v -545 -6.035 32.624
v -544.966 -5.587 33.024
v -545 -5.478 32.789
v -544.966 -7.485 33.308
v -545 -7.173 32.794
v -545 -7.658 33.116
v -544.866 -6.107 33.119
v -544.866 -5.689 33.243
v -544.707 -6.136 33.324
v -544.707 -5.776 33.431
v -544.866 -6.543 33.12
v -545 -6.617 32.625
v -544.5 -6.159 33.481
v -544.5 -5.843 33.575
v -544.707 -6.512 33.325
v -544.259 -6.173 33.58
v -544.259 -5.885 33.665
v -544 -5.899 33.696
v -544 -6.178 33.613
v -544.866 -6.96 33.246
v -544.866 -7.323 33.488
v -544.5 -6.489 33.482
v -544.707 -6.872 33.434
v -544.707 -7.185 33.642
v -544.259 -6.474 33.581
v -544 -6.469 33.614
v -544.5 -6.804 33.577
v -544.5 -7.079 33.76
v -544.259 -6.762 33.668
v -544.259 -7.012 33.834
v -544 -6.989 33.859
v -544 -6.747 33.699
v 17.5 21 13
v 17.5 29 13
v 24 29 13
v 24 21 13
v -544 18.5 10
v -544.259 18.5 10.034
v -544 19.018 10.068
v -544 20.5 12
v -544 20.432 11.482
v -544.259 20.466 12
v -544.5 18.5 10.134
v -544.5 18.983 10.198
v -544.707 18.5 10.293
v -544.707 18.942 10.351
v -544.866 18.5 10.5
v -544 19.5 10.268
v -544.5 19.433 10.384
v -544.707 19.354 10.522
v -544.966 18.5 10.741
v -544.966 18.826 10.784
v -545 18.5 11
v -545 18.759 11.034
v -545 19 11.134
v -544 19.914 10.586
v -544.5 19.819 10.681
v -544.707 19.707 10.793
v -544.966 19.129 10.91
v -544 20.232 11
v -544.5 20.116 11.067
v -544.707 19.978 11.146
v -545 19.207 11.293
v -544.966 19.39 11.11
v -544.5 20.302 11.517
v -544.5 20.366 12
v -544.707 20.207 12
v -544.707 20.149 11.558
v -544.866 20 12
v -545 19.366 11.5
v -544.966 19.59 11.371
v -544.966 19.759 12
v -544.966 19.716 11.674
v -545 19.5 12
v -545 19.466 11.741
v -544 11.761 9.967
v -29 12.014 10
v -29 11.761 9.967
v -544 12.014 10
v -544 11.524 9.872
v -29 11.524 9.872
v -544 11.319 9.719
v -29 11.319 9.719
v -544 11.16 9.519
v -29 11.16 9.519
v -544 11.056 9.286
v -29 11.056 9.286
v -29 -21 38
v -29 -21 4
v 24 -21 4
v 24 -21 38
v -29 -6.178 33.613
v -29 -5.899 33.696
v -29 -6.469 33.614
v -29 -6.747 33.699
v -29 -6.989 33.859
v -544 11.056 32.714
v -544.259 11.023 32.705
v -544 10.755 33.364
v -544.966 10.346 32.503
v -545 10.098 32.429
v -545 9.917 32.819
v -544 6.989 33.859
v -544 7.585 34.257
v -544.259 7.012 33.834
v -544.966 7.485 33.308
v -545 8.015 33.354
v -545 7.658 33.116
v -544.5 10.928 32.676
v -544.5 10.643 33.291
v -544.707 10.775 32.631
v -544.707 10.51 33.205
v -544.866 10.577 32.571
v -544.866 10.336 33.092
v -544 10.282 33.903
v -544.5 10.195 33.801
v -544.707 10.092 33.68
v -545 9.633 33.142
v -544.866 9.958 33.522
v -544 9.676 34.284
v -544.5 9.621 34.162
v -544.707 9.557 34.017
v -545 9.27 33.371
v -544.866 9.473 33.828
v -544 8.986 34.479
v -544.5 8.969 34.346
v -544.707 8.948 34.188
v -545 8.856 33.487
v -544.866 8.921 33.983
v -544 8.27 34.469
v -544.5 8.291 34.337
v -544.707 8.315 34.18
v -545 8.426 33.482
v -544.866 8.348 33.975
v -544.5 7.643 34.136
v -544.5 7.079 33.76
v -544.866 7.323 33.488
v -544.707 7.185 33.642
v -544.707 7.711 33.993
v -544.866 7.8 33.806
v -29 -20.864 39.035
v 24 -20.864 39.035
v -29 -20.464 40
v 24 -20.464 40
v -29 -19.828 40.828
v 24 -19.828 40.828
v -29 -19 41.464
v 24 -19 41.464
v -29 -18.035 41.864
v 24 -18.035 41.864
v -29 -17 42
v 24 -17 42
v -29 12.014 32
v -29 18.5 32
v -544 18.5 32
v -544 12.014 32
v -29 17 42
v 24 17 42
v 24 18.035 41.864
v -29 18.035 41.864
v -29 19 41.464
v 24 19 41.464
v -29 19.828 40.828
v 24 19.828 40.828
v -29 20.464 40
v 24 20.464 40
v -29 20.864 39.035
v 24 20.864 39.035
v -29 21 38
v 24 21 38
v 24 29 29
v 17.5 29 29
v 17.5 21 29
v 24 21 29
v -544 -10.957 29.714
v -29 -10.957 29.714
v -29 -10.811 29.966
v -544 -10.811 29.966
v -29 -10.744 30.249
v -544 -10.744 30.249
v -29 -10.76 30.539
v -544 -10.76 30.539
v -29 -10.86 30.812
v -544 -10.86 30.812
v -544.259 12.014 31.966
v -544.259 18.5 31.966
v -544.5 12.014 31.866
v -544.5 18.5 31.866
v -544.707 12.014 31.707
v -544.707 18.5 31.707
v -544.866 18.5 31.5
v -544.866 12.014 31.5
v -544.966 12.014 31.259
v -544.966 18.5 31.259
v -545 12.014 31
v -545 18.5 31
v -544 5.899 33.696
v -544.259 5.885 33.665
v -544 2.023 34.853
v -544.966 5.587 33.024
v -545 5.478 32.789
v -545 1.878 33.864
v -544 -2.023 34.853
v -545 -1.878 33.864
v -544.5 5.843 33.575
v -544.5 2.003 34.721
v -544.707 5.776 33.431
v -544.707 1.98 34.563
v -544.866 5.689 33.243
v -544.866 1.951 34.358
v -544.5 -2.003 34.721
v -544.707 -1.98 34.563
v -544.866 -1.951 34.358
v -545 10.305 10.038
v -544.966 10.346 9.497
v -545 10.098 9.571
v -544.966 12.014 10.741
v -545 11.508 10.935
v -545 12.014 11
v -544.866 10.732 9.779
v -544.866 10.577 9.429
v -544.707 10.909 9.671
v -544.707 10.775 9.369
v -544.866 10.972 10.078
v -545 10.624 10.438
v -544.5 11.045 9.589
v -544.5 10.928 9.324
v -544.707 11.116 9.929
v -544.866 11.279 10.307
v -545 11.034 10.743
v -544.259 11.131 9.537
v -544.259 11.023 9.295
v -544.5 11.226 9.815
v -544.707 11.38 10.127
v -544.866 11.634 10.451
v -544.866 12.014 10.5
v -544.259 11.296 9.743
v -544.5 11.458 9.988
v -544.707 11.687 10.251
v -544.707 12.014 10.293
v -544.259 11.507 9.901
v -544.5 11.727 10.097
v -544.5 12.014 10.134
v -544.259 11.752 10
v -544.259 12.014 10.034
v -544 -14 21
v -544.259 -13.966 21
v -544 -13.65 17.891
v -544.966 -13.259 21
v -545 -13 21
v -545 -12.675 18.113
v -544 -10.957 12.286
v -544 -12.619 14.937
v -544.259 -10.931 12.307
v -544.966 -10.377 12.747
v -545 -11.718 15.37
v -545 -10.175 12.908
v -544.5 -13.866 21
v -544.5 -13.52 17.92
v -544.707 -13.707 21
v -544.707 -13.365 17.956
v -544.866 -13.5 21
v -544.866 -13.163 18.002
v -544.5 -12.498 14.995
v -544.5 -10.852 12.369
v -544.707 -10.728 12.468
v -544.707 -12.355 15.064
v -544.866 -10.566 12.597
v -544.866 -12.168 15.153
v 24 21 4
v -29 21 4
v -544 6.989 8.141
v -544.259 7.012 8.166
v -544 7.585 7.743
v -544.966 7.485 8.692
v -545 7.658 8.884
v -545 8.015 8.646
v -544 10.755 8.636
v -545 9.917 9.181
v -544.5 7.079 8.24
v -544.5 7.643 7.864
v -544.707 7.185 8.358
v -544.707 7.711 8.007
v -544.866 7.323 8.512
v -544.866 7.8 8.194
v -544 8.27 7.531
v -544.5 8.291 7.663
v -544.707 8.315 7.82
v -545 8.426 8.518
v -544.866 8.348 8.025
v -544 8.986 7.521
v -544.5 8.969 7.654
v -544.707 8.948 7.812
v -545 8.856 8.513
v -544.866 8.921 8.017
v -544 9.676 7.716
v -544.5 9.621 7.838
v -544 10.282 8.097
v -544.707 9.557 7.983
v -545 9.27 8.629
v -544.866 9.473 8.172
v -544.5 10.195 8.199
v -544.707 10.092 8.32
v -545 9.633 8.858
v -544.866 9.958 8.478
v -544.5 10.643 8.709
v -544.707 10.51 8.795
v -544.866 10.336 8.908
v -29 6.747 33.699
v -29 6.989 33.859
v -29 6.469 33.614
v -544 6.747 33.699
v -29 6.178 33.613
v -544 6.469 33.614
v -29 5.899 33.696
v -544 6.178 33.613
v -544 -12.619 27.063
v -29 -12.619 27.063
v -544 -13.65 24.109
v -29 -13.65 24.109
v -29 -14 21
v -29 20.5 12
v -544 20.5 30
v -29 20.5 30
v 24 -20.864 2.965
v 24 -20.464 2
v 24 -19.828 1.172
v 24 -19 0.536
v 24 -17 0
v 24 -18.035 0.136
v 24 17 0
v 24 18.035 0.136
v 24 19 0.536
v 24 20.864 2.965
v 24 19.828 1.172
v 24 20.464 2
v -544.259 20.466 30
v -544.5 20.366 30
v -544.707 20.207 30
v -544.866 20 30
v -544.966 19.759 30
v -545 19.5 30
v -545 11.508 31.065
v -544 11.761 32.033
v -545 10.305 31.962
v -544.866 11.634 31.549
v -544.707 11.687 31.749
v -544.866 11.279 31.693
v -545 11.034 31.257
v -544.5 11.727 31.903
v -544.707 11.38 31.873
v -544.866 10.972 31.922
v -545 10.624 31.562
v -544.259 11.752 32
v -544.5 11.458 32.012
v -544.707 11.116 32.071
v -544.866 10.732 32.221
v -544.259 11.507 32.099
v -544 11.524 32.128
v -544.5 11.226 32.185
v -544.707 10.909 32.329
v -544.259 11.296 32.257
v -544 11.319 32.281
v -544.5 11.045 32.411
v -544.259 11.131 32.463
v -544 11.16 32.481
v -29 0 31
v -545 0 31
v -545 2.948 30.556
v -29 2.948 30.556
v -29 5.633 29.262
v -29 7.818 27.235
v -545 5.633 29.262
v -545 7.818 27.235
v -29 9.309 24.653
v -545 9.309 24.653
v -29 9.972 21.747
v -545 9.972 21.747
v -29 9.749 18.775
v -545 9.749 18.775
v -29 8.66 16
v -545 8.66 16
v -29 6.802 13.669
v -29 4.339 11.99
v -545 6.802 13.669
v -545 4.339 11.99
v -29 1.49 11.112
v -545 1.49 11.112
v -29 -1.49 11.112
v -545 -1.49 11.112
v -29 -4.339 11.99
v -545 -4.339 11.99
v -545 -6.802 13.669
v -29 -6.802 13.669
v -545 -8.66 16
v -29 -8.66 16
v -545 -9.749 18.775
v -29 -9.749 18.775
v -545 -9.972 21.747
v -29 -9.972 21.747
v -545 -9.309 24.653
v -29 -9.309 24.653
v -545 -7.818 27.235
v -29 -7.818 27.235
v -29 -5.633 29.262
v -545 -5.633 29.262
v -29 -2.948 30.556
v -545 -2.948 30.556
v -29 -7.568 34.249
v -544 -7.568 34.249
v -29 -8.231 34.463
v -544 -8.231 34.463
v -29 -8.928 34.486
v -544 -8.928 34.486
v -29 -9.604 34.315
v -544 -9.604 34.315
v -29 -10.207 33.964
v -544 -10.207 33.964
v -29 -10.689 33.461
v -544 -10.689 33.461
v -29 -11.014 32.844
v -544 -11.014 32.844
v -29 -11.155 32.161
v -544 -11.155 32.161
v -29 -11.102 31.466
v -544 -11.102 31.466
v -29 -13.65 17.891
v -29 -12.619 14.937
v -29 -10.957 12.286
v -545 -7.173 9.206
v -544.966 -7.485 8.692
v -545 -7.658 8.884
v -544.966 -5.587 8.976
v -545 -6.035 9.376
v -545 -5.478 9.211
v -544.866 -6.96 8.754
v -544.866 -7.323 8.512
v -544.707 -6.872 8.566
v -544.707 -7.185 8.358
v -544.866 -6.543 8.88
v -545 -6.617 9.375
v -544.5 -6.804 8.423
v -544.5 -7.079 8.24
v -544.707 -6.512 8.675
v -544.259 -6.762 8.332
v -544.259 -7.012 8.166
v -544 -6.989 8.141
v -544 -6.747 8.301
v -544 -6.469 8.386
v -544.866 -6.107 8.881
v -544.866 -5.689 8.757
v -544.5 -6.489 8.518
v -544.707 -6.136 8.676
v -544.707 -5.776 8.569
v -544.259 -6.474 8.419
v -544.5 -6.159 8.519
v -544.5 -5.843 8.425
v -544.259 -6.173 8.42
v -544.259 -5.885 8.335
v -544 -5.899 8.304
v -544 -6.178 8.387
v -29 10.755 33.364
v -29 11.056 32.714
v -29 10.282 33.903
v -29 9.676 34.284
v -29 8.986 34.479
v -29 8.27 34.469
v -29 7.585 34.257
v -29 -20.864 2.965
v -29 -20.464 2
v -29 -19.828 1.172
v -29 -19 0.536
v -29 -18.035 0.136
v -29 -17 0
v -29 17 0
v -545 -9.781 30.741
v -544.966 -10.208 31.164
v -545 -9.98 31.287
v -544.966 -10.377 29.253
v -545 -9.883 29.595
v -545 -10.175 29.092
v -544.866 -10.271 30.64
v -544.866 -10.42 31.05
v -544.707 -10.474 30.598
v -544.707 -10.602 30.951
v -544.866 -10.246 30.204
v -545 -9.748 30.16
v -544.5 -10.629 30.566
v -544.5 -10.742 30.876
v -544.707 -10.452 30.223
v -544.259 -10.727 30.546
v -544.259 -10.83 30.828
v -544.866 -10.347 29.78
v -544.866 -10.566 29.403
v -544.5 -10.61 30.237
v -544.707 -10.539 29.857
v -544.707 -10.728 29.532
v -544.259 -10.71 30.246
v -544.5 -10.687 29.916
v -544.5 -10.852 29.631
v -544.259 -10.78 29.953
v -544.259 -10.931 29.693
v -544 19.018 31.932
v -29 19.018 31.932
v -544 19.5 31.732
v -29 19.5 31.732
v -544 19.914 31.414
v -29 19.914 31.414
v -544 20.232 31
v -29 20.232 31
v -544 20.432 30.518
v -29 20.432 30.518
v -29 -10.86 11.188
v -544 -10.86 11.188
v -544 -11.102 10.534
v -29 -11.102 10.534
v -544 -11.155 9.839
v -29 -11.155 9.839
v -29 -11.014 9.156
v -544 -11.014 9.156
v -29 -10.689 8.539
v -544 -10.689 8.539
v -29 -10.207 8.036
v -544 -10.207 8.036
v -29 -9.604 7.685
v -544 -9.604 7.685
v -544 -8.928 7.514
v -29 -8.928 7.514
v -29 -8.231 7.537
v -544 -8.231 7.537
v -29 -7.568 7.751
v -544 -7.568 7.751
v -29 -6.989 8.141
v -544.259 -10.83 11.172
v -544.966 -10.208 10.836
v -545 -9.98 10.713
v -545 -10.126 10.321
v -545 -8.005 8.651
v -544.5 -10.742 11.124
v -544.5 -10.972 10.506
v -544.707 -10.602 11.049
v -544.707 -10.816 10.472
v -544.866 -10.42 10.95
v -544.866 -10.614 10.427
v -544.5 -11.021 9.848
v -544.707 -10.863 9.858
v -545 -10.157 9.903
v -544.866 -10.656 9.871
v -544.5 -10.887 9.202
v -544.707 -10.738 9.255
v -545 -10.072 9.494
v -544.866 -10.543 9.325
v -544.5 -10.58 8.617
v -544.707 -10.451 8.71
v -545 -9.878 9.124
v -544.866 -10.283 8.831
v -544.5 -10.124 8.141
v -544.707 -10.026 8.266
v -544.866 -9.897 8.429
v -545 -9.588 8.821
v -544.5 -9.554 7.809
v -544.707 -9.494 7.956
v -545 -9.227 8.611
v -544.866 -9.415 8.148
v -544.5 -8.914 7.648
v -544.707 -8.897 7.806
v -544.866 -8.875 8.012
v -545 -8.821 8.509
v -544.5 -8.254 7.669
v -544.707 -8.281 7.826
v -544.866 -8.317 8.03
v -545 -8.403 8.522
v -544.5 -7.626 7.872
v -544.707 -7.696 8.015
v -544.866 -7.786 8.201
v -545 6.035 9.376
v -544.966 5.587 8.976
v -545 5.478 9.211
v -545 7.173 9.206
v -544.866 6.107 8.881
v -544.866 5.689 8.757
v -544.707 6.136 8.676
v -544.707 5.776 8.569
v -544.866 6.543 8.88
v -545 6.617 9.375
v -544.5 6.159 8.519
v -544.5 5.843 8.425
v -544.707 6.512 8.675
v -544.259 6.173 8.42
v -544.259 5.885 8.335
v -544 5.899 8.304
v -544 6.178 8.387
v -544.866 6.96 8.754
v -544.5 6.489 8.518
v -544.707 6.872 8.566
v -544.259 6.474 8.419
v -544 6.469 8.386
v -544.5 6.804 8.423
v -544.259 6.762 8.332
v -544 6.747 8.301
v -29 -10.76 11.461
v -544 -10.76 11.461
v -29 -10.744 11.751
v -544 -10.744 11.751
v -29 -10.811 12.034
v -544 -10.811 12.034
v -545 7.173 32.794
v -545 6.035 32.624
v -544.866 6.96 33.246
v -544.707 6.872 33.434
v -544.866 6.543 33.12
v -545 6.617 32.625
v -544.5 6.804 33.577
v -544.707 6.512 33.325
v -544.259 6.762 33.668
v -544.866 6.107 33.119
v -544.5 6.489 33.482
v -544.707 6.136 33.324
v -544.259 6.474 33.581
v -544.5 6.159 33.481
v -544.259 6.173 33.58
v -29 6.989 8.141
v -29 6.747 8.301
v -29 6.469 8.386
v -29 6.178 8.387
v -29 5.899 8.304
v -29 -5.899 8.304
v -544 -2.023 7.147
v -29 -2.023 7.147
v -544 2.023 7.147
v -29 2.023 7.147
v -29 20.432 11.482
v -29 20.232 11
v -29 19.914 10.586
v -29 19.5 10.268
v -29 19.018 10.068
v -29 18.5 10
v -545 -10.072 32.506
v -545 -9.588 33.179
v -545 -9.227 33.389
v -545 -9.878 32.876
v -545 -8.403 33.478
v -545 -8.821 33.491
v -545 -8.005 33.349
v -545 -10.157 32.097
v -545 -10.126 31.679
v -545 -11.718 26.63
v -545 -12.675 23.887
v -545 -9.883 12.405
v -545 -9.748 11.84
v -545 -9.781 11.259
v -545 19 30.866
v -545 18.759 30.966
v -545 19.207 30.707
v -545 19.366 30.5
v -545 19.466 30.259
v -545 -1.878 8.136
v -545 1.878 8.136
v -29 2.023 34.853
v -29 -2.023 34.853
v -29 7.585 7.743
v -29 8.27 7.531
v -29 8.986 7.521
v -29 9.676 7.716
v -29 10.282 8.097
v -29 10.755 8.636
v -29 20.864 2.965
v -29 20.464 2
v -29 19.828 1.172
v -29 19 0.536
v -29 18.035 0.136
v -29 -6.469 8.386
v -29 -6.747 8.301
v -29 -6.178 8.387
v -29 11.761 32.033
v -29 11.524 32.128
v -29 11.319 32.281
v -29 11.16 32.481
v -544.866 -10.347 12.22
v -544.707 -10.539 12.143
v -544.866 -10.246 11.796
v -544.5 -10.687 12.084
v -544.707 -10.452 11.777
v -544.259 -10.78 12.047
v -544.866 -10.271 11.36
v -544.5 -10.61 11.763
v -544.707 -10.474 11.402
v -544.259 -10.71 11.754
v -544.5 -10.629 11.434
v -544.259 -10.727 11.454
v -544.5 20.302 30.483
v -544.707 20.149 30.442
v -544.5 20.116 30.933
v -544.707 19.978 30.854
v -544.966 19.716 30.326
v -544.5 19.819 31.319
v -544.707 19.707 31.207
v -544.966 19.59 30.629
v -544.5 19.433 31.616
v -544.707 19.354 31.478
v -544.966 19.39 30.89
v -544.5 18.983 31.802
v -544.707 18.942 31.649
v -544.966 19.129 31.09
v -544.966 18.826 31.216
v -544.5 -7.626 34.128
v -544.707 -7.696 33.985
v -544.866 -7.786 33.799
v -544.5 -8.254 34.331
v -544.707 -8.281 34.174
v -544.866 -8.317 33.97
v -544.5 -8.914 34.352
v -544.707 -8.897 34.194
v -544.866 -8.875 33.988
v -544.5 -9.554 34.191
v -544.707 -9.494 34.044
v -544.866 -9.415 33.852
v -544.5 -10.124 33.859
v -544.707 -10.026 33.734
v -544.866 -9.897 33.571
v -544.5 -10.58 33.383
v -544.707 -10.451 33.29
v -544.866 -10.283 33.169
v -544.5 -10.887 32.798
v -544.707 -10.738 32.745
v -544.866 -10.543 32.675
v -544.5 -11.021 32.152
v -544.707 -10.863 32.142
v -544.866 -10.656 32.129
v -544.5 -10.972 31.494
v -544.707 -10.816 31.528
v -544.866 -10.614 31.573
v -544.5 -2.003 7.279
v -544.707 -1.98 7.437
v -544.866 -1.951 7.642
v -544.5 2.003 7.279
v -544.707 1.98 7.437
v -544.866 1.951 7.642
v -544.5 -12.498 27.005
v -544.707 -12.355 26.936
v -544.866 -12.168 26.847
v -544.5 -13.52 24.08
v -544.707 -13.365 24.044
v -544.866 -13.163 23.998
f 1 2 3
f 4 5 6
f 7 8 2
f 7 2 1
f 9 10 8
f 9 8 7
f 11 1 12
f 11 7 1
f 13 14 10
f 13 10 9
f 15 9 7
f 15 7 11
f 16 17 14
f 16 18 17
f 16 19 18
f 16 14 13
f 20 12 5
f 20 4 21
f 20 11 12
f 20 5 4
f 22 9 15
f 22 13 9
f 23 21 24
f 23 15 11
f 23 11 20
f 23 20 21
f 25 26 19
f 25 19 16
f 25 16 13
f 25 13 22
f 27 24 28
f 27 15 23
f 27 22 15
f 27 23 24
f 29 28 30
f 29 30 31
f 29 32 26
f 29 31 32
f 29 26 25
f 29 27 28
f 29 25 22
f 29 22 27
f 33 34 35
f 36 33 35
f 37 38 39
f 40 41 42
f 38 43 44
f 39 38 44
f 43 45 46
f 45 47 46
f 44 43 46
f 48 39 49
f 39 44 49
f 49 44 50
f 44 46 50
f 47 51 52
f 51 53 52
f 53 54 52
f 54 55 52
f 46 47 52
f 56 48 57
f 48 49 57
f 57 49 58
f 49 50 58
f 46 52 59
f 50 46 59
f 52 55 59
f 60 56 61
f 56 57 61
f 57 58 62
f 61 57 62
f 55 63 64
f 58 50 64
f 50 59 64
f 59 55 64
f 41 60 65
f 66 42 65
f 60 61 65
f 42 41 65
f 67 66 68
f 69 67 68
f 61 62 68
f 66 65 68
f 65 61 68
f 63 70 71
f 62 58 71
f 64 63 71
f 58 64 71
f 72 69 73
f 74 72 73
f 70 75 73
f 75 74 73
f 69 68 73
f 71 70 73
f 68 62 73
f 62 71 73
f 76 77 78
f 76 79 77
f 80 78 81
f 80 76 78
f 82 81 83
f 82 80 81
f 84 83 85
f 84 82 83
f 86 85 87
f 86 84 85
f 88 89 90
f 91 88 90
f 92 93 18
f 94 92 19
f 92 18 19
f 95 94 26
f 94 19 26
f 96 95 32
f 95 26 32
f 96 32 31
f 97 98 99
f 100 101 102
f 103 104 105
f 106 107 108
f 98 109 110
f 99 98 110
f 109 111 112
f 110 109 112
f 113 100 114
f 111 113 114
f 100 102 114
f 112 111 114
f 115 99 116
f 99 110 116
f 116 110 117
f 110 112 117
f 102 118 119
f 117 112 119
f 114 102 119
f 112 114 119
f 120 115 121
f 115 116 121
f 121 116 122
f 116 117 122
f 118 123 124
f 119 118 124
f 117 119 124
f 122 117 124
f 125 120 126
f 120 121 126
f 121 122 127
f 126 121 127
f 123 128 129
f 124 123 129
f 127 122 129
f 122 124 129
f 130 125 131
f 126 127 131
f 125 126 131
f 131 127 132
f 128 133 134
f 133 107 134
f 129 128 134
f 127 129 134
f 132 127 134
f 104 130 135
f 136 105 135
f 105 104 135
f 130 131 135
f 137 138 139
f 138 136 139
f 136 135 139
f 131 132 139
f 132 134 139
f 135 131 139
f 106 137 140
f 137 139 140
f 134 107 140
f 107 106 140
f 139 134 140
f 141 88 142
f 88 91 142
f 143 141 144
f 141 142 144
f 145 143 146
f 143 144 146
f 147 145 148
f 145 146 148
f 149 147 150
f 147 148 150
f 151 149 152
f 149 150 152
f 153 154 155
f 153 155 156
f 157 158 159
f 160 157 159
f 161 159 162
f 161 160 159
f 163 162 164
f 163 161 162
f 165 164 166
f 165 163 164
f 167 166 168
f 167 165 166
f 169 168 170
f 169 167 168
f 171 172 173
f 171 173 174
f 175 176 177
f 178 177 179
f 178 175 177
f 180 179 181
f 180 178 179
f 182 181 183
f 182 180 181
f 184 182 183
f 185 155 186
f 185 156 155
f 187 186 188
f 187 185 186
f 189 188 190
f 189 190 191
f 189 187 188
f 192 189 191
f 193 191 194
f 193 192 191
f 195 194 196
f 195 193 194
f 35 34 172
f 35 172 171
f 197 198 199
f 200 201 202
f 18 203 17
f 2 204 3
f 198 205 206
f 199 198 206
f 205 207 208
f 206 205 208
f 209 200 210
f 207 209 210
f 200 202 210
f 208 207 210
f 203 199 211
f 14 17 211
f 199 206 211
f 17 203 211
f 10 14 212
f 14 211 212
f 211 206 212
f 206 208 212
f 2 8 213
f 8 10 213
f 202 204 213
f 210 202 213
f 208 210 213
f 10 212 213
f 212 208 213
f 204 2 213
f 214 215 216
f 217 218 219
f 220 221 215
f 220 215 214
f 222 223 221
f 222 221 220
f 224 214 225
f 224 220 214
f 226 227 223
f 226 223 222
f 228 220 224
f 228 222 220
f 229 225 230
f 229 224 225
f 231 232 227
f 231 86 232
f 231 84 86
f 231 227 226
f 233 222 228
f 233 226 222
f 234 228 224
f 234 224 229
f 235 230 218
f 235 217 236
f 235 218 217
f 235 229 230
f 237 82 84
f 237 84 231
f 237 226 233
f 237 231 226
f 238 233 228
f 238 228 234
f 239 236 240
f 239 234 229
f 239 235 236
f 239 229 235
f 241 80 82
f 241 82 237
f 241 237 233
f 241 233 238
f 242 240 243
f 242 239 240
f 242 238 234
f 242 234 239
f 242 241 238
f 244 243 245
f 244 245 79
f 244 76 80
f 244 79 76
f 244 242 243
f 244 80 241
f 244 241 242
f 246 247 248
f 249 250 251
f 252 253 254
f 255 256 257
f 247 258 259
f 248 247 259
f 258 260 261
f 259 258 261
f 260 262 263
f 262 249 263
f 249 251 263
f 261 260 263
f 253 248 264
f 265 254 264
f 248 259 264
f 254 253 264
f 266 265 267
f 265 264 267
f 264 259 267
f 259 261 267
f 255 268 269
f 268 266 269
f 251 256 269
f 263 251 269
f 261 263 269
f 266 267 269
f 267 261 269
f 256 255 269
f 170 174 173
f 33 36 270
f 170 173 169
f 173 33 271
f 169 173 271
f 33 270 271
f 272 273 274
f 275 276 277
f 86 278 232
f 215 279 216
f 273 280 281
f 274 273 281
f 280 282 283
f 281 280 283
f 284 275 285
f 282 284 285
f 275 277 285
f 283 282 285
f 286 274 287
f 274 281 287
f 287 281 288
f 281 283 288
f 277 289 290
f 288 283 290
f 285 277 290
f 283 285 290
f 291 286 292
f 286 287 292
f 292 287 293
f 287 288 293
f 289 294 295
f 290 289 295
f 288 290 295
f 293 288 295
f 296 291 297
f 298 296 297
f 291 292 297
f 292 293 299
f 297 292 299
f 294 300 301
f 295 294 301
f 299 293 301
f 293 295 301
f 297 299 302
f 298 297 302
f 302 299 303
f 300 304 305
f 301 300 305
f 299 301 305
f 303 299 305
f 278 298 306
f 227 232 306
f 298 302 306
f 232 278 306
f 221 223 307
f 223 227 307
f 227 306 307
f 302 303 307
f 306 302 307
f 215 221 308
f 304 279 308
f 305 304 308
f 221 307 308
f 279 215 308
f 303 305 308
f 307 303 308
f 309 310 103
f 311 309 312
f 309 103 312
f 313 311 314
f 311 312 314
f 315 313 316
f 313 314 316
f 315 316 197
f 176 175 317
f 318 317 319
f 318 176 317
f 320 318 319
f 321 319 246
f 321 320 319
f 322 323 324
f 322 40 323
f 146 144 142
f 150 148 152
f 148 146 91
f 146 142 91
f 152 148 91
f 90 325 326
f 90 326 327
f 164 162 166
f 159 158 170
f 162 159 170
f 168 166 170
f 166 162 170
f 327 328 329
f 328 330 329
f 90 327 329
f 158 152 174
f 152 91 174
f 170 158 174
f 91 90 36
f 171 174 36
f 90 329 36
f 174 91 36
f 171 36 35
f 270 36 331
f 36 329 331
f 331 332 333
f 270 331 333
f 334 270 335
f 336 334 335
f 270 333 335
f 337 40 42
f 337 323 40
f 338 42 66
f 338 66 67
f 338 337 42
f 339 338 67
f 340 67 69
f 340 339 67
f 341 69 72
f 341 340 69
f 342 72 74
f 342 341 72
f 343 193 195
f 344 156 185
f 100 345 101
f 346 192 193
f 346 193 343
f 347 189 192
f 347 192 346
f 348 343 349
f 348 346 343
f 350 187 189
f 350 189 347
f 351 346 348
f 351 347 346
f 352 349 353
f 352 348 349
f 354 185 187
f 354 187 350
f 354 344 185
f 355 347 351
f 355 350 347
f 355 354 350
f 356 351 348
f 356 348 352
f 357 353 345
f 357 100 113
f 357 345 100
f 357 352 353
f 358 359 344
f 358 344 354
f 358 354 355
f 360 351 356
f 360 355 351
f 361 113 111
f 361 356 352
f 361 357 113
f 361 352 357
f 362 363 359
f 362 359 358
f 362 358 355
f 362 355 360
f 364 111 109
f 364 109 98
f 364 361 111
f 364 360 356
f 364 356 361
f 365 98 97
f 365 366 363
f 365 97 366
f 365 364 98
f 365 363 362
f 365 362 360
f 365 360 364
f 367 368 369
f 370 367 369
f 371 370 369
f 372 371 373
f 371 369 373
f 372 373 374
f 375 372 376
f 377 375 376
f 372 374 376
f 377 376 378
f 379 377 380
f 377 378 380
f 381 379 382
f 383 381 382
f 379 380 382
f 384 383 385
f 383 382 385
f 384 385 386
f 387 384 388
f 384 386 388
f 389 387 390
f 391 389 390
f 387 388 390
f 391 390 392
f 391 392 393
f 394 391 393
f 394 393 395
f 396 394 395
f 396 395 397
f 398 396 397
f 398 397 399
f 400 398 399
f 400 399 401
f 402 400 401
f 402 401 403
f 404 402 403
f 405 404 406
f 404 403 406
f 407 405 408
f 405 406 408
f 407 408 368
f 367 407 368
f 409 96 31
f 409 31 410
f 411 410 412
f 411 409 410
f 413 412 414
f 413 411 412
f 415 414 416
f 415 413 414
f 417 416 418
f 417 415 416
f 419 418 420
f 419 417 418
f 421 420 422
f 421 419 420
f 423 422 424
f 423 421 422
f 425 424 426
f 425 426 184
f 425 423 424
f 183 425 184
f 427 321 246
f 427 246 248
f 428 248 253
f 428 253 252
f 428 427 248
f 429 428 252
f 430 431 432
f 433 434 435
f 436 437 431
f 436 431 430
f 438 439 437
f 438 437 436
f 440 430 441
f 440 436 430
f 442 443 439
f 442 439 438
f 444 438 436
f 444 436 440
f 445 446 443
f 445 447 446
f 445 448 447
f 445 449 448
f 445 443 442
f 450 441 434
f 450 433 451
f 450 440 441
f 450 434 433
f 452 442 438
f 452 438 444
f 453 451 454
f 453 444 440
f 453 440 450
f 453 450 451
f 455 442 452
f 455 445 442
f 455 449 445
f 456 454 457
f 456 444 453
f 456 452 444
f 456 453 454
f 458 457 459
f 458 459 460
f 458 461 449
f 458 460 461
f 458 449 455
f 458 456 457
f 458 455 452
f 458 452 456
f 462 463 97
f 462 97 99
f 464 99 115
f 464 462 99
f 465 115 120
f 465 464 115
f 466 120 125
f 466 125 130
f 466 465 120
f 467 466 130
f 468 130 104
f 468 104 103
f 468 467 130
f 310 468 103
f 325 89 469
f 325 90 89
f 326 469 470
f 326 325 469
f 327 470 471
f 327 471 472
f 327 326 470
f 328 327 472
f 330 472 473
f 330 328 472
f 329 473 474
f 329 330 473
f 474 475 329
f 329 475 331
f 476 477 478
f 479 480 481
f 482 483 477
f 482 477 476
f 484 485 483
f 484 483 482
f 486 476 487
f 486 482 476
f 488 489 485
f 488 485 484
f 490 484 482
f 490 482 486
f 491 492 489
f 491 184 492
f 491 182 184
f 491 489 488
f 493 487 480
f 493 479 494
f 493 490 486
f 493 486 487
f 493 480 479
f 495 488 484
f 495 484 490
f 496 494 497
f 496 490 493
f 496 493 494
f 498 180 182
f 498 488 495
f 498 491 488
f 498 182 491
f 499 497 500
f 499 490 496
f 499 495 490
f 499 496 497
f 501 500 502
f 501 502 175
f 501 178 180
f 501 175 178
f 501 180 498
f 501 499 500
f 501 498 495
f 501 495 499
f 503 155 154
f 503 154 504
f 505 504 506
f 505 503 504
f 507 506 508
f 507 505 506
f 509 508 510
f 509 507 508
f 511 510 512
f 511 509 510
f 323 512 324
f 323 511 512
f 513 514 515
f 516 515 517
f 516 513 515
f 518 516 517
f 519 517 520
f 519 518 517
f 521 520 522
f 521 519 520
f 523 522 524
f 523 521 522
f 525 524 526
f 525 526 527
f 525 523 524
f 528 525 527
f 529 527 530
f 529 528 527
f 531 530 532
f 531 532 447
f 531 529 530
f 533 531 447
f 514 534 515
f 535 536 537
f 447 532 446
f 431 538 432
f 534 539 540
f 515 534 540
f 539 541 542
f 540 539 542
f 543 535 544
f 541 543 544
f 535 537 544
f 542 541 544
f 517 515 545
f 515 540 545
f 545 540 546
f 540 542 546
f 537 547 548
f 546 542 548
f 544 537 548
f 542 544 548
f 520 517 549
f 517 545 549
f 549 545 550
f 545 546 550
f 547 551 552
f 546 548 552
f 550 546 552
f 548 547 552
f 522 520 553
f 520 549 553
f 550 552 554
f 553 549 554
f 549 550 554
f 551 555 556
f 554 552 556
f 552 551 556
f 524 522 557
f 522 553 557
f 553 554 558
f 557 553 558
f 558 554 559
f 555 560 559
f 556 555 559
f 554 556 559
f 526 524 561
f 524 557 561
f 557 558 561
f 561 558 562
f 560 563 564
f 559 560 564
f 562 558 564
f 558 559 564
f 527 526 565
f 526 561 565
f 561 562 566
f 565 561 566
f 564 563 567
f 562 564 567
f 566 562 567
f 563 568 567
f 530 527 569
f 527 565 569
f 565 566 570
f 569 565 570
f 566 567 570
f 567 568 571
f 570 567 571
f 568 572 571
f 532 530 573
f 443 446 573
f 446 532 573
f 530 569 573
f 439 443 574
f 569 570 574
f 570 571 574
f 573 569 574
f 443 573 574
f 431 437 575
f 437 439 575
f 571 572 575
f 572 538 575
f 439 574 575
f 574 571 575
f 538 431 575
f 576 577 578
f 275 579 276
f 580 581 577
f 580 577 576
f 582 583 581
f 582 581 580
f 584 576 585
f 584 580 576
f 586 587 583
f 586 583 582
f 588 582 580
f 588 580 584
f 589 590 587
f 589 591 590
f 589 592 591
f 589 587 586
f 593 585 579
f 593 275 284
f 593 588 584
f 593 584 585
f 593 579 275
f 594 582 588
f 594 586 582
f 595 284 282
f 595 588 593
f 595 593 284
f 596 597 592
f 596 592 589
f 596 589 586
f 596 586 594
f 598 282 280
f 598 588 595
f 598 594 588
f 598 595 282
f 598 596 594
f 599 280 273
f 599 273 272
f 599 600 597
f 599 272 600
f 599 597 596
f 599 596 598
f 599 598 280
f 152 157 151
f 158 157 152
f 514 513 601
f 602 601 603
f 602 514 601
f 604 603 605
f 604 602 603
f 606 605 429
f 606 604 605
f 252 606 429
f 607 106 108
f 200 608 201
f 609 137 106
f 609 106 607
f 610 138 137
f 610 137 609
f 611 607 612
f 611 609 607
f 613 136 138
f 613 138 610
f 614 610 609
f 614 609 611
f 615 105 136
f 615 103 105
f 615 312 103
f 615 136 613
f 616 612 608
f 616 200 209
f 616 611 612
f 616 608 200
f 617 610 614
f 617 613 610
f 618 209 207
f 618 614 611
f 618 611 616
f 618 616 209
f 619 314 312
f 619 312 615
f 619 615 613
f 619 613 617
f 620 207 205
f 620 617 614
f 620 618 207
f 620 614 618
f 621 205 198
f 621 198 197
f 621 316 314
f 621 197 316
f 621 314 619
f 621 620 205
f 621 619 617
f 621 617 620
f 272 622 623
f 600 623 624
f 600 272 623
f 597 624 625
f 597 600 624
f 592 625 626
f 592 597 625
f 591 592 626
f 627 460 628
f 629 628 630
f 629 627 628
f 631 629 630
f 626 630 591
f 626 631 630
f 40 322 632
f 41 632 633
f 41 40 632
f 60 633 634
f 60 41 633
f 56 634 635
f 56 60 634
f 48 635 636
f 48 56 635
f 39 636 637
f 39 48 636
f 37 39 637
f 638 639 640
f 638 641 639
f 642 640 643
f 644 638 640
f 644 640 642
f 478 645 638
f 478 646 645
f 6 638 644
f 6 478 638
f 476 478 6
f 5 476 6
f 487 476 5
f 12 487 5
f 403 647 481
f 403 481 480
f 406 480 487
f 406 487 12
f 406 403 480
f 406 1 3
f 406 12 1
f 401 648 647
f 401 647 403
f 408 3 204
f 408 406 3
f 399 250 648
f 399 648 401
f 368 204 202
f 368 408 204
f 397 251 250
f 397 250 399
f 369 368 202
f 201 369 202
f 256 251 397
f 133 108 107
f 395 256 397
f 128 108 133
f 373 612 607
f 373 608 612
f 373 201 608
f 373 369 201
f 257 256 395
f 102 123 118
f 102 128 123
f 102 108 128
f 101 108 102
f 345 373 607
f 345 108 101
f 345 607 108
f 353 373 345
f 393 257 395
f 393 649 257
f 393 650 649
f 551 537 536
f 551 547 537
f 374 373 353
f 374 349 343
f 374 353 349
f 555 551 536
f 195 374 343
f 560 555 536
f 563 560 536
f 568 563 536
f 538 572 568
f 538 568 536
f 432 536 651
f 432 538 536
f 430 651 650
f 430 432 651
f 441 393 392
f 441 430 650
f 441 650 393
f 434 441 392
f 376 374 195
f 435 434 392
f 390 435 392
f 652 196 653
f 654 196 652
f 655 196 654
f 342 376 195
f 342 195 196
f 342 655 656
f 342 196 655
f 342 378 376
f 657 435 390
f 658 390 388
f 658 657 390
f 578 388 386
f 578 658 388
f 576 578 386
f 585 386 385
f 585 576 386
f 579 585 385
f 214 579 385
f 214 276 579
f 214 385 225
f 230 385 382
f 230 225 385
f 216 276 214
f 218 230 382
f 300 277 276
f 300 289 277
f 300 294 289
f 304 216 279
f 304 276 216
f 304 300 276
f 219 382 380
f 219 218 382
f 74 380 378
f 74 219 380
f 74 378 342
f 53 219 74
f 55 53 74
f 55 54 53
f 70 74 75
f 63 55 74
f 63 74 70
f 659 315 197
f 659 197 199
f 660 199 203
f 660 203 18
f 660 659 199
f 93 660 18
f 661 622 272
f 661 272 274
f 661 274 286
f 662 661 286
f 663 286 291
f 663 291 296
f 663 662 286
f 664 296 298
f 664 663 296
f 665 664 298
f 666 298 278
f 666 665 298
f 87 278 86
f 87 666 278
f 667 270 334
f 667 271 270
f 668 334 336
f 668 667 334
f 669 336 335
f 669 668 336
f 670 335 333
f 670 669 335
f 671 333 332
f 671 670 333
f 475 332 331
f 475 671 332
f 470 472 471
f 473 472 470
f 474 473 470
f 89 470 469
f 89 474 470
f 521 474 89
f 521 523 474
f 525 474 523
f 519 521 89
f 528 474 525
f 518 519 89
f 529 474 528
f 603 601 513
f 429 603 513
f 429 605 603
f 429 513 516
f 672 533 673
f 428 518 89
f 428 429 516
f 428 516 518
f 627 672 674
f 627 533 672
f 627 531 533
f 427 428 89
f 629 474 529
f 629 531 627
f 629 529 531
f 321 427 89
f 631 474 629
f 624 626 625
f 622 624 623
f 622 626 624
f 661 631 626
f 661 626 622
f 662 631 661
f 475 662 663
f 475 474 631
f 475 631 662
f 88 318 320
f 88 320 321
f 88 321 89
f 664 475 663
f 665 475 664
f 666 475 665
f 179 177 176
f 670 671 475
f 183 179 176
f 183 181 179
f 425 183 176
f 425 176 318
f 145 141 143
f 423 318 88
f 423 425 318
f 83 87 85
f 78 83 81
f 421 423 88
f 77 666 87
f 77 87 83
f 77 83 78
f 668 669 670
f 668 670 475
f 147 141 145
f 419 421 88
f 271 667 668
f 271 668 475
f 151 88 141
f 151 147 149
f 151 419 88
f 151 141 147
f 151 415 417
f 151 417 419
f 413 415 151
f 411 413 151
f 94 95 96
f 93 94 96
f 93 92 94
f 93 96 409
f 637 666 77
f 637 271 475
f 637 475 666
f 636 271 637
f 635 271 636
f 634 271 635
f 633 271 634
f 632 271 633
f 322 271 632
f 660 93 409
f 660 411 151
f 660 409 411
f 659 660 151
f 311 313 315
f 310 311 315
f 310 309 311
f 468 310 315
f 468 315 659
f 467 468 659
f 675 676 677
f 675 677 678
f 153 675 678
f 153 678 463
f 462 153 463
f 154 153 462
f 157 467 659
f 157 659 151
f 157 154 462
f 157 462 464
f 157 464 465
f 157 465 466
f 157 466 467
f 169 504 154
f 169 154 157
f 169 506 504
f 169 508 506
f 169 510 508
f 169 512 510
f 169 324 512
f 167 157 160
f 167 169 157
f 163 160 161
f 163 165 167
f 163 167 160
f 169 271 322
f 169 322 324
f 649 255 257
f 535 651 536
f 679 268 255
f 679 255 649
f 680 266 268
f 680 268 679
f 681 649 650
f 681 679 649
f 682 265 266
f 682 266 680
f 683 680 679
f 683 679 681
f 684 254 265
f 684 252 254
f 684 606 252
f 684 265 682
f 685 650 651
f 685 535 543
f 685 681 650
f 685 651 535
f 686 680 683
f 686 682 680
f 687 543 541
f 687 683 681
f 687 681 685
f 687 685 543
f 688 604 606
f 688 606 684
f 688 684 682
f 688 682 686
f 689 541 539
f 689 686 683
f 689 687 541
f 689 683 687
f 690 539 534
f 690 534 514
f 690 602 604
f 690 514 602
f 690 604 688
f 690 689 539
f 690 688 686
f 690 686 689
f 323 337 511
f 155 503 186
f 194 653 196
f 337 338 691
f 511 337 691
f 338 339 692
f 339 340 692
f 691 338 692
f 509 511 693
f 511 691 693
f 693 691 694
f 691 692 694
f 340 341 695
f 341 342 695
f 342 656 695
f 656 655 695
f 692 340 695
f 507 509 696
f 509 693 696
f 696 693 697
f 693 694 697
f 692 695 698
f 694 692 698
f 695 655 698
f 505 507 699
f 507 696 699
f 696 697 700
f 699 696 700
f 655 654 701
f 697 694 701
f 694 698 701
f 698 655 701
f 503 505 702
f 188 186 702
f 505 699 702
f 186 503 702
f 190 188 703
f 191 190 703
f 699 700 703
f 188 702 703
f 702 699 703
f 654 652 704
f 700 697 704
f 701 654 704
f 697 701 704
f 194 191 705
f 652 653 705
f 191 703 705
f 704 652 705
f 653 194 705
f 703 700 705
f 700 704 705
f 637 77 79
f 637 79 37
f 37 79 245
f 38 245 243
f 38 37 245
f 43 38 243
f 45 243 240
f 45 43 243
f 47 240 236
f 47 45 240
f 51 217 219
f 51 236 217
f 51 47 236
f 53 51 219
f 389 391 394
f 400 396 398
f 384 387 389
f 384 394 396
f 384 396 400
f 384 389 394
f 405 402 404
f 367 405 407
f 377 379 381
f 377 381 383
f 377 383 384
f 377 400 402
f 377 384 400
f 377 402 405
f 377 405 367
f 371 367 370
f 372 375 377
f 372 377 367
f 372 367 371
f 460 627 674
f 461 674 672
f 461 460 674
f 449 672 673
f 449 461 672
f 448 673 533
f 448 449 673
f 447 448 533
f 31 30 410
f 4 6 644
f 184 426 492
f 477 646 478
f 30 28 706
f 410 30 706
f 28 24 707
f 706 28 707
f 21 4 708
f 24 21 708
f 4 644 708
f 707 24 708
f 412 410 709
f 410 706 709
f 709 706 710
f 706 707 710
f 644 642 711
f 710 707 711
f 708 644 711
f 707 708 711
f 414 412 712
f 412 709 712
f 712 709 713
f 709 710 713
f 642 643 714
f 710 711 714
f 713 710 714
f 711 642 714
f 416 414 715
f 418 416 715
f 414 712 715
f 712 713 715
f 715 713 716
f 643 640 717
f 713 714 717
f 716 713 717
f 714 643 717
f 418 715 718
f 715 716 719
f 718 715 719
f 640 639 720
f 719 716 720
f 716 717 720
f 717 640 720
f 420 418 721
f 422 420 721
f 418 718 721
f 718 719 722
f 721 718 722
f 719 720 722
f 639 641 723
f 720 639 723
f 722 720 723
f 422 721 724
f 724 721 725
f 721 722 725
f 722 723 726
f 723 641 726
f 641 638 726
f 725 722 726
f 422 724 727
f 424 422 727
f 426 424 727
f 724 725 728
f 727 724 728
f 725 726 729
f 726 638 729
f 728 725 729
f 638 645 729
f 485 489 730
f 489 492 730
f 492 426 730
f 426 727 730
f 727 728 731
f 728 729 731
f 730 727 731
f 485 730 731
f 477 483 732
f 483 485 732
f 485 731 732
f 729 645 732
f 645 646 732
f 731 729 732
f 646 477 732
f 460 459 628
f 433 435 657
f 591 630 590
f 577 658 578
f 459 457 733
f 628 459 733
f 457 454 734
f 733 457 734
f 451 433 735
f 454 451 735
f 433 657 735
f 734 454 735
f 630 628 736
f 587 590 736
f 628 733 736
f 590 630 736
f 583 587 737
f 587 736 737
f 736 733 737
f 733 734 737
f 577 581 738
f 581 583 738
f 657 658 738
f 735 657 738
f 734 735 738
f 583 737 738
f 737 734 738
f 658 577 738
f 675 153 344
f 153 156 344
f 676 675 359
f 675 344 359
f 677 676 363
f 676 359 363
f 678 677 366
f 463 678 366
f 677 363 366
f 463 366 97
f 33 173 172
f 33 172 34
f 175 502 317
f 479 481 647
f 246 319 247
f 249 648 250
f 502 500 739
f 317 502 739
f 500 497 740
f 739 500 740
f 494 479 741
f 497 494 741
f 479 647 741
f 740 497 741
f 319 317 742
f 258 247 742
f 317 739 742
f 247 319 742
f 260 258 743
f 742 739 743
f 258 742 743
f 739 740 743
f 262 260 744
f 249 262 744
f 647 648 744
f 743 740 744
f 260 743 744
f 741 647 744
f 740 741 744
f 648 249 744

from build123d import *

# Parameters (mm, degrees)
SKETCH_1_W          = 516
SKETCH_1_H          = 35
SKETCH_1_W_2        = 5
SKETCH_1_H_2        = 42
SKETCH_1_W_3        = 48
EXTRUDE_1_DEPTH     = 42
SKETCH_3_W          = 516
SKETCH_3_H          = 42
CUT_EXTRUDE_1_DEPTH = 0.5
FILLET_1_R          = 7
SKETCH_4_R          = 10
CUT_EXTRUDE_2_DEPTH = 516
CUT_EXTRUDE_START   = -516
CUT_EXTRUDE_3_DEPTH = 516
FILLET_2_R          = 2
FILLET_3_R          = 4
FILLET_5_R          = 1
SKETCH_6_W          = 6.5
SKETCH_6_H          = 16
EXTRUDE_2_DEPTH     = 8


# Read off the part's stored shape, not the designer's step: Вырез-Вытянуть3
with BuildPart() as part:
    # Эскиз1 → Бобышка-Вытянуть1 (new body)
    with BuildSketch(Plane.XY):
        with Locations((-287, 3.5)):
            Rectangle(SKETCH_1_W, SKETCH_1_H)
        with Locations((-26.5, 0)):
            Rectangle(SKETCH_1_W_2, SKETCH_1_H_2)
        Rectangle(SKETCH_1_W_3, SKETCH_1_H_2)
    extrude(amount=EXTRUDE_1_DEPTH)

    # Эскиз3 → Вырез-Вытянуть1 (cut)
    with BuildSketch(Plane(origin=(0, 21, 0), x_dir=(1, 0, 0), z_dir=(0, 1, 0))):
        with Locations((-287, -21)):
            Rectangle(SKETCH_3_W, SKETCH_3_H)
    extrude(amount=-CUT_EXTRUDE_1_DEPTH, mode=Mode.SUBTRACT)

    # Скругление1
    fillet_1_edges = [part.edges().sort_by_distance(p)[0] for p in [
        (-287, -14, 42),
        (-287, -14, 0),
        (-287, 20.5, 0),
        (-287, 20.5, 42),
    ]]
    fillet(fillet_1_edges, radius=FILLET_1_R)

    # Эскиз4 → Вырез-Вытянуть2 (cut)
    with BuildSketch(Plane.ZY.offset(545)):
        with Locations((21, 0)):
            Circle(SKETCH_4_R)
    extrude(amount=-CUT_EXTRUDE_2_DEPTH, mode=Mode.SUBTRACT)

    # Вырез-Вытянуть3 outline → Вырез-Вытянуть3 (cut)
    with BuildSketch(Plane.ZY.offset(545).offset(CUT_EXTRUDE_START)):
        with BuildLine():
            ThreePointArc((11.715680056, -10.478616473), (8.035714286, -10.206727973), (8.63508525, -6.565735543))
            ThreePointArc((8.63508525, -6.565735543), (7, 0), (8.63508525, 6.565735543))
            ThreePointArc((8.63508525, 6.565735543), (7.60351338, 9.372189345), (10, 11.160254038))
            Line((10, 11.160254038), (10, 20.5))
            Line((10, 20.5), (7, 20.5))
            ThreePointArc((7, 20.5), (2.050252532, 18.449747468), (0, 13.5))
            Line((0, 13.5), (0, -7))
            ThreePointArc((0, -7), (2.050252532, -11.949747468), (7, -14))
            Line((7, -14), (21.000000051, -14))
            ThreePointArc((21.000000051, -14), (16.035155143, -13.090084627), (11.715680056, -10.478616473))
        make_face()
        with BuildLine():
            ThreePointArc((30.284319944, -10.478616473), (25.964844905, -13.090084609), (21.000000051, -14))
            Line((21.000000051, -14), (35, -14))
            ThreePointArc((35, -14), (39.949747468, -11.949747468), (42, -7))
            Line((42, -7), (42, 13.5))
            ThreePointArc((42, 13.5), (39.949747468, 18.449747468), (35, 20.5))
            Line((35, 20.5), (32, 20.5))
            Line((32, 20.5), (32, 11.160254038))
            ThreePointArc((32, 11.160254038), (34.39648662, 9.372189345), (33.36491475, 6.565735543))
            ThreePointArc((33.36491475, 6.565735543), (35, 0), (33.36491475, -6.565735543))
            ThreePointArc((33.36491475, -6.565735543), (33.964285714, -10.206727973), (30.284319944, -10.478616473))
        make_face()
    extrude(amount=CUT_EXTRUDE_3_DEPTH, mode=Mode.SUBTRACT)

    # Скругление2
    fillet_2_edges = [part.edges().sort_by_distance(p)[0] for p in [
        (-287, 20.5, 10),
        (-287, 20.5, 32),
    ]]
    fillet(fillet_2_edges, radius=FILLET_2_R)

    # Скругление3
    fillet_3_edges = [part.edges().sort_by_distance(p)[0] for p in [
        (-2.5, -21, 42),
        (-2.5, 21, 42),
        (-2.5, 21, 0),
        (-2.5, -21, 0),
    ]]
    fillet(fillet_3_edges, radius=FILLET_3_R)

    # Скругление5
    fillet_5_edges = [part.edges().sort_by_distance(p)[0] for p in [
        (-287, 11.160254038, 10),
        (-545, 9.372189345, 7.60351338),
        (-287, 6.565735543, 8.63508525),
        (-545, 0, 7),
        (-545, 14.830127019, 10),
        (-287, 6.565735543, 33.36491475),
        (-545, 9.372189345, 34.39648662),
        (-287, 11.160254038, 32),
        (-545, 14.830127019, 32),
        (-287, -10.478616473, 30.284319944),
        (-545, -10.206727973, 33.964285714),
        (-287, -6.565735543, 33.36491475),
        (-545, 0, 35),
        (-545, 20.5, 21),
        (-545, 19.914213562, 31.414213562),
        (-545, 19.914213562, 10.585786438),
        (-287, -6.565735543, 8.63508525),
        (-545, -10.206727973, 8.035714286),
        (-287, -10.478616473, 11.715680056),
        (-545, -13.090084627, 16.035155143),
    ]]
    fillet(fillet_5_edges, radius=FILLET_5_R)

    # Эскиз6 → Бобышка-Вытянуть2 (add)
    with BuildSketch(Plane(origin=(0, 21, 0), x_dir=(1, 0, 0), z_dir=(0, 1, 0))):
        with Locations((20.75, -21)):
            Rectangle(SKETCH_6_W, SKETCH_6_H)
    extrude(amount=EXTRUDE_2_DEPTH)


solid = part.part
